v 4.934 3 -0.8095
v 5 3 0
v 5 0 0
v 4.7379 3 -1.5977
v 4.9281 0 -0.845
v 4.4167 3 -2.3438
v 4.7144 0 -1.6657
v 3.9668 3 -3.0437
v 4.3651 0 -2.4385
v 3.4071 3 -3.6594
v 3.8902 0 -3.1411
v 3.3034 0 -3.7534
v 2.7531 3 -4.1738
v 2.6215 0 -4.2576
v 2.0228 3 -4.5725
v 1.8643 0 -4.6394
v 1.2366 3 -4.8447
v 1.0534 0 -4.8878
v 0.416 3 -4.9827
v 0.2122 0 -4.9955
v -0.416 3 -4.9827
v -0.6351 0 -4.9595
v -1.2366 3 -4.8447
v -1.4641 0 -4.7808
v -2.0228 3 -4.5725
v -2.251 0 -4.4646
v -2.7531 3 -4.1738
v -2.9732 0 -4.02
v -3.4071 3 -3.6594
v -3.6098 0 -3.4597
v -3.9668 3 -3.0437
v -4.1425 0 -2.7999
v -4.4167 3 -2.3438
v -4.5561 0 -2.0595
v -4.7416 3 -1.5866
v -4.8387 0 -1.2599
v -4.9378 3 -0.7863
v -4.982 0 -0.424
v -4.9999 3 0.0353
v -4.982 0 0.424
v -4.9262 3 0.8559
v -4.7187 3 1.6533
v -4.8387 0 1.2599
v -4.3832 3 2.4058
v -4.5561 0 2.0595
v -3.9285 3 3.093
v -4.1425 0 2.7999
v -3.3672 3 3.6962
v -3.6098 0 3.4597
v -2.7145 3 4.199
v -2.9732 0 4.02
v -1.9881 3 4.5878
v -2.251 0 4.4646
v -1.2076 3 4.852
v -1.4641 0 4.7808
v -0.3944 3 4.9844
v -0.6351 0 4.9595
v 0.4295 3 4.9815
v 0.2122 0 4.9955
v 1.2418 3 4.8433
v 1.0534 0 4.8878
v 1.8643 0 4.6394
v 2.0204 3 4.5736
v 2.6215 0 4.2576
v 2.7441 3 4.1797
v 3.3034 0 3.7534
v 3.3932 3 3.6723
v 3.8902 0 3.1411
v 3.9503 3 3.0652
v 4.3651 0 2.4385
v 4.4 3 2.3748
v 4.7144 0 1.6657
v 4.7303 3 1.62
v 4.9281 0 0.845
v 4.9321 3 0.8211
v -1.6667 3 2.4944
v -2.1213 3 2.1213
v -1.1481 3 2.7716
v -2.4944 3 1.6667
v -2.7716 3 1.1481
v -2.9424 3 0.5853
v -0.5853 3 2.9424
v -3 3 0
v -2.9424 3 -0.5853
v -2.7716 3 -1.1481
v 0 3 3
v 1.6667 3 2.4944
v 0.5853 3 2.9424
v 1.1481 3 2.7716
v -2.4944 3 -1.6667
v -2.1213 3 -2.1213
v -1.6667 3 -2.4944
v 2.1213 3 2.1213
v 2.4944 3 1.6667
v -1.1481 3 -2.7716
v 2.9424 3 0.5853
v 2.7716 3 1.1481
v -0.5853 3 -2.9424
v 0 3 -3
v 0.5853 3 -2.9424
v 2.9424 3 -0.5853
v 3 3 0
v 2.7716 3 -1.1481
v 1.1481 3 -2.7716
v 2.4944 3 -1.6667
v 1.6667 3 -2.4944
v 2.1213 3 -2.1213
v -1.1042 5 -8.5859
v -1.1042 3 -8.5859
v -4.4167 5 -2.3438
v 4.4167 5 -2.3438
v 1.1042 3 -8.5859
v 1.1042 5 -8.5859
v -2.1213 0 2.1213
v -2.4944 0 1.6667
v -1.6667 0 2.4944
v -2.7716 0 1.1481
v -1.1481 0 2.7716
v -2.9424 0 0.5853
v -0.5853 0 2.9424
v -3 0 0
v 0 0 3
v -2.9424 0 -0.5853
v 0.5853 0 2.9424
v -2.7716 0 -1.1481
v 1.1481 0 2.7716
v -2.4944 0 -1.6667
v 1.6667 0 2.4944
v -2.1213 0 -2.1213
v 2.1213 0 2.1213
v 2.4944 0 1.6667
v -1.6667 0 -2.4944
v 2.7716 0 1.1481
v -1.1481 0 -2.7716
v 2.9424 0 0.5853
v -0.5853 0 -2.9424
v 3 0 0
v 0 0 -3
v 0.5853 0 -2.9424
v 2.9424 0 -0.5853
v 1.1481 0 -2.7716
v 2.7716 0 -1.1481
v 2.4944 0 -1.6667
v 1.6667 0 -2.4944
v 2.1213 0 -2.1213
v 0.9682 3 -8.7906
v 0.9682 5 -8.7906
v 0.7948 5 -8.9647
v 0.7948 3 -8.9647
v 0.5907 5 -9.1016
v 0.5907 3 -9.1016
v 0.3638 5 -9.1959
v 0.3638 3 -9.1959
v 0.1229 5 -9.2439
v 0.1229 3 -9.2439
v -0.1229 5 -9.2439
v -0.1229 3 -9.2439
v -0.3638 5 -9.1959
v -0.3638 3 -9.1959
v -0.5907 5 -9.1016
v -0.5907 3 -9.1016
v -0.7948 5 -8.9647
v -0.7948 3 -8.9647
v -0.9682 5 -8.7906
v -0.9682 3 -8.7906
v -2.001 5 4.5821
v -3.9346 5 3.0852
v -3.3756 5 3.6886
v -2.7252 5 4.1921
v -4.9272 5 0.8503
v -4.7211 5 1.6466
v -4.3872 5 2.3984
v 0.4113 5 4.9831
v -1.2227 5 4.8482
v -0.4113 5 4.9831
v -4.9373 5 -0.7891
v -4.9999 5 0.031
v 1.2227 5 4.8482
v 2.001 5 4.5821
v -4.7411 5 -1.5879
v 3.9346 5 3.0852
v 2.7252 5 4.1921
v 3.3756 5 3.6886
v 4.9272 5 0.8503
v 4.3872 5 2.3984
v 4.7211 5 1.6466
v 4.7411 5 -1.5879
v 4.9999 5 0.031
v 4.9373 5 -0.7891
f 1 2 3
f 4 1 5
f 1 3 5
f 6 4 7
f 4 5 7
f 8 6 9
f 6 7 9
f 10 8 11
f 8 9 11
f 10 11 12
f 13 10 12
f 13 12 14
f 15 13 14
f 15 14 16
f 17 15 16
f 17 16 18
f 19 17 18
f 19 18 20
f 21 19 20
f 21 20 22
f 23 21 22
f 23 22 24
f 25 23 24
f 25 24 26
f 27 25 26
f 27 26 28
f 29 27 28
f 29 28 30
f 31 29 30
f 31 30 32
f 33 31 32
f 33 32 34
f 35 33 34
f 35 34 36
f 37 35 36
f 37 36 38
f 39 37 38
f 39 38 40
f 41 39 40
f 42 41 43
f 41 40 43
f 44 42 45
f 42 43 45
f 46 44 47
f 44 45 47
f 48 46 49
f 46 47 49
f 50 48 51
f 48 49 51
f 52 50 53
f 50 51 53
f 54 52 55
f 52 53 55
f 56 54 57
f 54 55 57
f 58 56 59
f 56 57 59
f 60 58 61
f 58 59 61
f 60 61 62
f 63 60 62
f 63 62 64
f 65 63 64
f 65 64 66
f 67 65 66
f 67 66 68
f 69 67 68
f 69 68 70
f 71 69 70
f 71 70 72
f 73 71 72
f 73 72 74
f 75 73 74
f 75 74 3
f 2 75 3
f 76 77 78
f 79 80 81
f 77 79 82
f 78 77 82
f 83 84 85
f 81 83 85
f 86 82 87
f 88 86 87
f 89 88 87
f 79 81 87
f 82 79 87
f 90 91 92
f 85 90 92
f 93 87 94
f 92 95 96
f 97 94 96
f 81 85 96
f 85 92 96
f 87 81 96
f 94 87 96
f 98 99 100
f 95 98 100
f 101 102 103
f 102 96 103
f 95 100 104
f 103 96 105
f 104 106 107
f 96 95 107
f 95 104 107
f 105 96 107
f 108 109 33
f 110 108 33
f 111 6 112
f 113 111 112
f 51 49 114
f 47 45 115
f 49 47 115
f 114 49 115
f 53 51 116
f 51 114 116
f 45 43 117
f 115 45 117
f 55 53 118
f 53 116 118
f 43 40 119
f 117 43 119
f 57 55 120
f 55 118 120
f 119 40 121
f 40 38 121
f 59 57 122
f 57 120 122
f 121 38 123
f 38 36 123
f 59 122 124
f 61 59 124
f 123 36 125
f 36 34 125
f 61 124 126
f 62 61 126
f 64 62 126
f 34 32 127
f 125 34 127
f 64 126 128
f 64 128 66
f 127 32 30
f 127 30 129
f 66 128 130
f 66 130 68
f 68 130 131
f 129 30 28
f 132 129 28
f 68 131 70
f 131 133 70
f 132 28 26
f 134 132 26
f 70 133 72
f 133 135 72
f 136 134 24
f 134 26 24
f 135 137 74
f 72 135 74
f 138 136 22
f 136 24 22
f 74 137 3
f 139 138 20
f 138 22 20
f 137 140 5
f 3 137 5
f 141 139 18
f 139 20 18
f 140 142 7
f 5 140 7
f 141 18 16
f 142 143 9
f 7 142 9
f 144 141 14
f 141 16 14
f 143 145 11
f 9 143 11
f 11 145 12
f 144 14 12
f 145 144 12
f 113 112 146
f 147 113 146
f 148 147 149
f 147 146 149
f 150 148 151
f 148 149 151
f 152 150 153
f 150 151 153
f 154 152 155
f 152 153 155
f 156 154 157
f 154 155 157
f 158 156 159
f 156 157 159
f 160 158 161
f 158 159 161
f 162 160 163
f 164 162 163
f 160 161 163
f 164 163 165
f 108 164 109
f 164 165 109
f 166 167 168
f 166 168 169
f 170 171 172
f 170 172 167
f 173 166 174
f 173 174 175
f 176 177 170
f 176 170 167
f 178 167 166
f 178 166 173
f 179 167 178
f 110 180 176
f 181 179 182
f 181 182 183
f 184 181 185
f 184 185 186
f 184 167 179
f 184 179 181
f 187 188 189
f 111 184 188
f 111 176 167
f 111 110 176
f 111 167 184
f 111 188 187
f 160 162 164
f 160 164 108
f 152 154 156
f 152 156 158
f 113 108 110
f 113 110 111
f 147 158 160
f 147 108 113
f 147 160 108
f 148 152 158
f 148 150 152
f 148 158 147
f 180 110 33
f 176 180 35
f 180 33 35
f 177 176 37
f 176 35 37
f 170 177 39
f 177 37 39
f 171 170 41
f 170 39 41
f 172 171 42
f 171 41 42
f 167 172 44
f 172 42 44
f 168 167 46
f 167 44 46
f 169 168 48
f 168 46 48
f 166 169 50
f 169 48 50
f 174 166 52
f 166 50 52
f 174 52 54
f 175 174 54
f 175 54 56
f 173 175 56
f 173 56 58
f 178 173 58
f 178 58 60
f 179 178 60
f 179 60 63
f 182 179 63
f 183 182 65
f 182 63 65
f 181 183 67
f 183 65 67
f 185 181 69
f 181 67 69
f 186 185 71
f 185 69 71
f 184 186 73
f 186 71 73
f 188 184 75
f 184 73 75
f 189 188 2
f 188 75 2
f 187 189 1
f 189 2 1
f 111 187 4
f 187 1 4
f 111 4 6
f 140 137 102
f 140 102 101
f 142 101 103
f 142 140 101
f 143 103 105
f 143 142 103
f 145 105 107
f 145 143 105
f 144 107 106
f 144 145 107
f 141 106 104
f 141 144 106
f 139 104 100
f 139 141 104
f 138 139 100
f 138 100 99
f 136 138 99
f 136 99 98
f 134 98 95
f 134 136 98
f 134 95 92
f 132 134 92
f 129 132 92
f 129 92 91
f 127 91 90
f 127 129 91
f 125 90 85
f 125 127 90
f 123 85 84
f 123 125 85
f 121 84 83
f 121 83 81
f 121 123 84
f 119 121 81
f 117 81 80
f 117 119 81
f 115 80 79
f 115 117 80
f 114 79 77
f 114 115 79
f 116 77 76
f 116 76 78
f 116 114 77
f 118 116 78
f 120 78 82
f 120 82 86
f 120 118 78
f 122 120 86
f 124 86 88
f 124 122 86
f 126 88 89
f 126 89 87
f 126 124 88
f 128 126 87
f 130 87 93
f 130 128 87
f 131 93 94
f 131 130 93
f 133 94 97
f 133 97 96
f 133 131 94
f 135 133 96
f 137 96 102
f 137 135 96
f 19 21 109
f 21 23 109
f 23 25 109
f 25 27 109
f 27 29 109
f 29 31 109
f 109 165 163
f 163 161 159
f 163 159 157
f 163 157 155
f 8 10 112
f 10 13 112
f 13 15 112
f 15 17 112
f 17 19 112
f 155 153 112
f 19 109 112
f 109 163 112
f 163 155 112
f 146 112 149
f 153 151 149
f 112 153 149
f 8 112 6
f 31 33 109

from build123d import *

# Parameters (mm, degrees)
SKETCH1_R           = 5.000000033
SKETCH1_R_2         = 3
BOSS_EXTRUDE1_DEPTH = 3
BOSS_EXTRUDE2_DEPTH = 2


with BuildPart() as part:
    # Sketch1 → Boss-Extrude1 (new body)
    with BuildSketch(Plane(origin=(0, 0, 0), x_dir=(1, 0, 0), z_dir=(0, 1, 0))):
        Circle(SKETCH1_R)
        Circle(SKETCH1_R_2, mode=Mode.SUBTRACT)
    extrude(amount=BOSS_EXTRUDE1_DEPTH)

    # Sketch2 → Boss-Extrude2 (add)
    with BuildSketch(Plane(origin=(0, 3, 0), x_dir=(1, 0, 0), z_dir=(0, 1, 0))):
        with BuildLine():
            Line((4.416654416, 2.343750007), (1.104163597, 8.585937596))
            ThreePointArc((1.104163597, 8.585937596), (0, 9.250000098), (-1.104163597, 8.585937596))
            Line((-1.104163597, 8.585937596), (-4.416654416, 2.343750007))
            ThreePointArc((-4.416654416, 2.343750007), (0, -5.000000033), (4.416654416, 2.343750007))
        make_face()
    extrude(amount=BOSS_EXTRUDE2_DEPTH)


solid = part.part
